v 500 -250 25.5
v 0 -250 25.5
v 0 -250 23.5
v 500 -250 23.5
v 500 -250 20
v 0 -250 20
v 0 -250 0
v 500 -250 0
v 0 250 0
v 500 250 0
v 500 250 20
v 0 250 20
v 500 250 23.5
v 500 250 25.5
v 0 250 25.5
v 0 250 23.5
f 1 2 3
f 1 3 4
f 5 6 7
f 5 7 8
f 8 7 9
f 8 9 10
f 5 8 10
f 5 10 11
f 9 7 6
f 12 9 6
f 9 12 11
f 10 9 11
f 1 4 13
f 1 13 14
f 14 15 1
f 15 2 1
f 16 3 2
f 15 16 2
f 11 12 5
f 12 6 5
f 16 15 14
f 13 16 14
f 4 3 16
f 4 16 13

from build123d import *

# Parameters (mm, degrees)
F0_W     = 500
F0_H     = 20
F1_DEPTH = 250
F6_W     = 500
F6_H     = 2
F7_DEPTH = 250


# Not quite as in the source:
# - the program builds the solid bodies; features that only make, move or delete a surface that nothing else refers to are left out


with BuildPart() as f1:
    # F0 (on Front) → F1 (new body, symmetric)
    with BuildSketch(Plane.XZ):
        with Locations((250, 10)):
            Rectangle(F0_W, F0_H)
    extrude(amount=F1_DEPTH, both=True)


with BuildPart() as f7:
    # F6 (on Front) → F7 (new body, symmetric)
    with BuildSketch(Plane.XZ):
        with Locations((250, 24.5)):
            Rectangle(F6_W, F6_H)
    extrude(amount=F7_DEPTH, both=True)


solid = Compound([f1.part, f7.part])
